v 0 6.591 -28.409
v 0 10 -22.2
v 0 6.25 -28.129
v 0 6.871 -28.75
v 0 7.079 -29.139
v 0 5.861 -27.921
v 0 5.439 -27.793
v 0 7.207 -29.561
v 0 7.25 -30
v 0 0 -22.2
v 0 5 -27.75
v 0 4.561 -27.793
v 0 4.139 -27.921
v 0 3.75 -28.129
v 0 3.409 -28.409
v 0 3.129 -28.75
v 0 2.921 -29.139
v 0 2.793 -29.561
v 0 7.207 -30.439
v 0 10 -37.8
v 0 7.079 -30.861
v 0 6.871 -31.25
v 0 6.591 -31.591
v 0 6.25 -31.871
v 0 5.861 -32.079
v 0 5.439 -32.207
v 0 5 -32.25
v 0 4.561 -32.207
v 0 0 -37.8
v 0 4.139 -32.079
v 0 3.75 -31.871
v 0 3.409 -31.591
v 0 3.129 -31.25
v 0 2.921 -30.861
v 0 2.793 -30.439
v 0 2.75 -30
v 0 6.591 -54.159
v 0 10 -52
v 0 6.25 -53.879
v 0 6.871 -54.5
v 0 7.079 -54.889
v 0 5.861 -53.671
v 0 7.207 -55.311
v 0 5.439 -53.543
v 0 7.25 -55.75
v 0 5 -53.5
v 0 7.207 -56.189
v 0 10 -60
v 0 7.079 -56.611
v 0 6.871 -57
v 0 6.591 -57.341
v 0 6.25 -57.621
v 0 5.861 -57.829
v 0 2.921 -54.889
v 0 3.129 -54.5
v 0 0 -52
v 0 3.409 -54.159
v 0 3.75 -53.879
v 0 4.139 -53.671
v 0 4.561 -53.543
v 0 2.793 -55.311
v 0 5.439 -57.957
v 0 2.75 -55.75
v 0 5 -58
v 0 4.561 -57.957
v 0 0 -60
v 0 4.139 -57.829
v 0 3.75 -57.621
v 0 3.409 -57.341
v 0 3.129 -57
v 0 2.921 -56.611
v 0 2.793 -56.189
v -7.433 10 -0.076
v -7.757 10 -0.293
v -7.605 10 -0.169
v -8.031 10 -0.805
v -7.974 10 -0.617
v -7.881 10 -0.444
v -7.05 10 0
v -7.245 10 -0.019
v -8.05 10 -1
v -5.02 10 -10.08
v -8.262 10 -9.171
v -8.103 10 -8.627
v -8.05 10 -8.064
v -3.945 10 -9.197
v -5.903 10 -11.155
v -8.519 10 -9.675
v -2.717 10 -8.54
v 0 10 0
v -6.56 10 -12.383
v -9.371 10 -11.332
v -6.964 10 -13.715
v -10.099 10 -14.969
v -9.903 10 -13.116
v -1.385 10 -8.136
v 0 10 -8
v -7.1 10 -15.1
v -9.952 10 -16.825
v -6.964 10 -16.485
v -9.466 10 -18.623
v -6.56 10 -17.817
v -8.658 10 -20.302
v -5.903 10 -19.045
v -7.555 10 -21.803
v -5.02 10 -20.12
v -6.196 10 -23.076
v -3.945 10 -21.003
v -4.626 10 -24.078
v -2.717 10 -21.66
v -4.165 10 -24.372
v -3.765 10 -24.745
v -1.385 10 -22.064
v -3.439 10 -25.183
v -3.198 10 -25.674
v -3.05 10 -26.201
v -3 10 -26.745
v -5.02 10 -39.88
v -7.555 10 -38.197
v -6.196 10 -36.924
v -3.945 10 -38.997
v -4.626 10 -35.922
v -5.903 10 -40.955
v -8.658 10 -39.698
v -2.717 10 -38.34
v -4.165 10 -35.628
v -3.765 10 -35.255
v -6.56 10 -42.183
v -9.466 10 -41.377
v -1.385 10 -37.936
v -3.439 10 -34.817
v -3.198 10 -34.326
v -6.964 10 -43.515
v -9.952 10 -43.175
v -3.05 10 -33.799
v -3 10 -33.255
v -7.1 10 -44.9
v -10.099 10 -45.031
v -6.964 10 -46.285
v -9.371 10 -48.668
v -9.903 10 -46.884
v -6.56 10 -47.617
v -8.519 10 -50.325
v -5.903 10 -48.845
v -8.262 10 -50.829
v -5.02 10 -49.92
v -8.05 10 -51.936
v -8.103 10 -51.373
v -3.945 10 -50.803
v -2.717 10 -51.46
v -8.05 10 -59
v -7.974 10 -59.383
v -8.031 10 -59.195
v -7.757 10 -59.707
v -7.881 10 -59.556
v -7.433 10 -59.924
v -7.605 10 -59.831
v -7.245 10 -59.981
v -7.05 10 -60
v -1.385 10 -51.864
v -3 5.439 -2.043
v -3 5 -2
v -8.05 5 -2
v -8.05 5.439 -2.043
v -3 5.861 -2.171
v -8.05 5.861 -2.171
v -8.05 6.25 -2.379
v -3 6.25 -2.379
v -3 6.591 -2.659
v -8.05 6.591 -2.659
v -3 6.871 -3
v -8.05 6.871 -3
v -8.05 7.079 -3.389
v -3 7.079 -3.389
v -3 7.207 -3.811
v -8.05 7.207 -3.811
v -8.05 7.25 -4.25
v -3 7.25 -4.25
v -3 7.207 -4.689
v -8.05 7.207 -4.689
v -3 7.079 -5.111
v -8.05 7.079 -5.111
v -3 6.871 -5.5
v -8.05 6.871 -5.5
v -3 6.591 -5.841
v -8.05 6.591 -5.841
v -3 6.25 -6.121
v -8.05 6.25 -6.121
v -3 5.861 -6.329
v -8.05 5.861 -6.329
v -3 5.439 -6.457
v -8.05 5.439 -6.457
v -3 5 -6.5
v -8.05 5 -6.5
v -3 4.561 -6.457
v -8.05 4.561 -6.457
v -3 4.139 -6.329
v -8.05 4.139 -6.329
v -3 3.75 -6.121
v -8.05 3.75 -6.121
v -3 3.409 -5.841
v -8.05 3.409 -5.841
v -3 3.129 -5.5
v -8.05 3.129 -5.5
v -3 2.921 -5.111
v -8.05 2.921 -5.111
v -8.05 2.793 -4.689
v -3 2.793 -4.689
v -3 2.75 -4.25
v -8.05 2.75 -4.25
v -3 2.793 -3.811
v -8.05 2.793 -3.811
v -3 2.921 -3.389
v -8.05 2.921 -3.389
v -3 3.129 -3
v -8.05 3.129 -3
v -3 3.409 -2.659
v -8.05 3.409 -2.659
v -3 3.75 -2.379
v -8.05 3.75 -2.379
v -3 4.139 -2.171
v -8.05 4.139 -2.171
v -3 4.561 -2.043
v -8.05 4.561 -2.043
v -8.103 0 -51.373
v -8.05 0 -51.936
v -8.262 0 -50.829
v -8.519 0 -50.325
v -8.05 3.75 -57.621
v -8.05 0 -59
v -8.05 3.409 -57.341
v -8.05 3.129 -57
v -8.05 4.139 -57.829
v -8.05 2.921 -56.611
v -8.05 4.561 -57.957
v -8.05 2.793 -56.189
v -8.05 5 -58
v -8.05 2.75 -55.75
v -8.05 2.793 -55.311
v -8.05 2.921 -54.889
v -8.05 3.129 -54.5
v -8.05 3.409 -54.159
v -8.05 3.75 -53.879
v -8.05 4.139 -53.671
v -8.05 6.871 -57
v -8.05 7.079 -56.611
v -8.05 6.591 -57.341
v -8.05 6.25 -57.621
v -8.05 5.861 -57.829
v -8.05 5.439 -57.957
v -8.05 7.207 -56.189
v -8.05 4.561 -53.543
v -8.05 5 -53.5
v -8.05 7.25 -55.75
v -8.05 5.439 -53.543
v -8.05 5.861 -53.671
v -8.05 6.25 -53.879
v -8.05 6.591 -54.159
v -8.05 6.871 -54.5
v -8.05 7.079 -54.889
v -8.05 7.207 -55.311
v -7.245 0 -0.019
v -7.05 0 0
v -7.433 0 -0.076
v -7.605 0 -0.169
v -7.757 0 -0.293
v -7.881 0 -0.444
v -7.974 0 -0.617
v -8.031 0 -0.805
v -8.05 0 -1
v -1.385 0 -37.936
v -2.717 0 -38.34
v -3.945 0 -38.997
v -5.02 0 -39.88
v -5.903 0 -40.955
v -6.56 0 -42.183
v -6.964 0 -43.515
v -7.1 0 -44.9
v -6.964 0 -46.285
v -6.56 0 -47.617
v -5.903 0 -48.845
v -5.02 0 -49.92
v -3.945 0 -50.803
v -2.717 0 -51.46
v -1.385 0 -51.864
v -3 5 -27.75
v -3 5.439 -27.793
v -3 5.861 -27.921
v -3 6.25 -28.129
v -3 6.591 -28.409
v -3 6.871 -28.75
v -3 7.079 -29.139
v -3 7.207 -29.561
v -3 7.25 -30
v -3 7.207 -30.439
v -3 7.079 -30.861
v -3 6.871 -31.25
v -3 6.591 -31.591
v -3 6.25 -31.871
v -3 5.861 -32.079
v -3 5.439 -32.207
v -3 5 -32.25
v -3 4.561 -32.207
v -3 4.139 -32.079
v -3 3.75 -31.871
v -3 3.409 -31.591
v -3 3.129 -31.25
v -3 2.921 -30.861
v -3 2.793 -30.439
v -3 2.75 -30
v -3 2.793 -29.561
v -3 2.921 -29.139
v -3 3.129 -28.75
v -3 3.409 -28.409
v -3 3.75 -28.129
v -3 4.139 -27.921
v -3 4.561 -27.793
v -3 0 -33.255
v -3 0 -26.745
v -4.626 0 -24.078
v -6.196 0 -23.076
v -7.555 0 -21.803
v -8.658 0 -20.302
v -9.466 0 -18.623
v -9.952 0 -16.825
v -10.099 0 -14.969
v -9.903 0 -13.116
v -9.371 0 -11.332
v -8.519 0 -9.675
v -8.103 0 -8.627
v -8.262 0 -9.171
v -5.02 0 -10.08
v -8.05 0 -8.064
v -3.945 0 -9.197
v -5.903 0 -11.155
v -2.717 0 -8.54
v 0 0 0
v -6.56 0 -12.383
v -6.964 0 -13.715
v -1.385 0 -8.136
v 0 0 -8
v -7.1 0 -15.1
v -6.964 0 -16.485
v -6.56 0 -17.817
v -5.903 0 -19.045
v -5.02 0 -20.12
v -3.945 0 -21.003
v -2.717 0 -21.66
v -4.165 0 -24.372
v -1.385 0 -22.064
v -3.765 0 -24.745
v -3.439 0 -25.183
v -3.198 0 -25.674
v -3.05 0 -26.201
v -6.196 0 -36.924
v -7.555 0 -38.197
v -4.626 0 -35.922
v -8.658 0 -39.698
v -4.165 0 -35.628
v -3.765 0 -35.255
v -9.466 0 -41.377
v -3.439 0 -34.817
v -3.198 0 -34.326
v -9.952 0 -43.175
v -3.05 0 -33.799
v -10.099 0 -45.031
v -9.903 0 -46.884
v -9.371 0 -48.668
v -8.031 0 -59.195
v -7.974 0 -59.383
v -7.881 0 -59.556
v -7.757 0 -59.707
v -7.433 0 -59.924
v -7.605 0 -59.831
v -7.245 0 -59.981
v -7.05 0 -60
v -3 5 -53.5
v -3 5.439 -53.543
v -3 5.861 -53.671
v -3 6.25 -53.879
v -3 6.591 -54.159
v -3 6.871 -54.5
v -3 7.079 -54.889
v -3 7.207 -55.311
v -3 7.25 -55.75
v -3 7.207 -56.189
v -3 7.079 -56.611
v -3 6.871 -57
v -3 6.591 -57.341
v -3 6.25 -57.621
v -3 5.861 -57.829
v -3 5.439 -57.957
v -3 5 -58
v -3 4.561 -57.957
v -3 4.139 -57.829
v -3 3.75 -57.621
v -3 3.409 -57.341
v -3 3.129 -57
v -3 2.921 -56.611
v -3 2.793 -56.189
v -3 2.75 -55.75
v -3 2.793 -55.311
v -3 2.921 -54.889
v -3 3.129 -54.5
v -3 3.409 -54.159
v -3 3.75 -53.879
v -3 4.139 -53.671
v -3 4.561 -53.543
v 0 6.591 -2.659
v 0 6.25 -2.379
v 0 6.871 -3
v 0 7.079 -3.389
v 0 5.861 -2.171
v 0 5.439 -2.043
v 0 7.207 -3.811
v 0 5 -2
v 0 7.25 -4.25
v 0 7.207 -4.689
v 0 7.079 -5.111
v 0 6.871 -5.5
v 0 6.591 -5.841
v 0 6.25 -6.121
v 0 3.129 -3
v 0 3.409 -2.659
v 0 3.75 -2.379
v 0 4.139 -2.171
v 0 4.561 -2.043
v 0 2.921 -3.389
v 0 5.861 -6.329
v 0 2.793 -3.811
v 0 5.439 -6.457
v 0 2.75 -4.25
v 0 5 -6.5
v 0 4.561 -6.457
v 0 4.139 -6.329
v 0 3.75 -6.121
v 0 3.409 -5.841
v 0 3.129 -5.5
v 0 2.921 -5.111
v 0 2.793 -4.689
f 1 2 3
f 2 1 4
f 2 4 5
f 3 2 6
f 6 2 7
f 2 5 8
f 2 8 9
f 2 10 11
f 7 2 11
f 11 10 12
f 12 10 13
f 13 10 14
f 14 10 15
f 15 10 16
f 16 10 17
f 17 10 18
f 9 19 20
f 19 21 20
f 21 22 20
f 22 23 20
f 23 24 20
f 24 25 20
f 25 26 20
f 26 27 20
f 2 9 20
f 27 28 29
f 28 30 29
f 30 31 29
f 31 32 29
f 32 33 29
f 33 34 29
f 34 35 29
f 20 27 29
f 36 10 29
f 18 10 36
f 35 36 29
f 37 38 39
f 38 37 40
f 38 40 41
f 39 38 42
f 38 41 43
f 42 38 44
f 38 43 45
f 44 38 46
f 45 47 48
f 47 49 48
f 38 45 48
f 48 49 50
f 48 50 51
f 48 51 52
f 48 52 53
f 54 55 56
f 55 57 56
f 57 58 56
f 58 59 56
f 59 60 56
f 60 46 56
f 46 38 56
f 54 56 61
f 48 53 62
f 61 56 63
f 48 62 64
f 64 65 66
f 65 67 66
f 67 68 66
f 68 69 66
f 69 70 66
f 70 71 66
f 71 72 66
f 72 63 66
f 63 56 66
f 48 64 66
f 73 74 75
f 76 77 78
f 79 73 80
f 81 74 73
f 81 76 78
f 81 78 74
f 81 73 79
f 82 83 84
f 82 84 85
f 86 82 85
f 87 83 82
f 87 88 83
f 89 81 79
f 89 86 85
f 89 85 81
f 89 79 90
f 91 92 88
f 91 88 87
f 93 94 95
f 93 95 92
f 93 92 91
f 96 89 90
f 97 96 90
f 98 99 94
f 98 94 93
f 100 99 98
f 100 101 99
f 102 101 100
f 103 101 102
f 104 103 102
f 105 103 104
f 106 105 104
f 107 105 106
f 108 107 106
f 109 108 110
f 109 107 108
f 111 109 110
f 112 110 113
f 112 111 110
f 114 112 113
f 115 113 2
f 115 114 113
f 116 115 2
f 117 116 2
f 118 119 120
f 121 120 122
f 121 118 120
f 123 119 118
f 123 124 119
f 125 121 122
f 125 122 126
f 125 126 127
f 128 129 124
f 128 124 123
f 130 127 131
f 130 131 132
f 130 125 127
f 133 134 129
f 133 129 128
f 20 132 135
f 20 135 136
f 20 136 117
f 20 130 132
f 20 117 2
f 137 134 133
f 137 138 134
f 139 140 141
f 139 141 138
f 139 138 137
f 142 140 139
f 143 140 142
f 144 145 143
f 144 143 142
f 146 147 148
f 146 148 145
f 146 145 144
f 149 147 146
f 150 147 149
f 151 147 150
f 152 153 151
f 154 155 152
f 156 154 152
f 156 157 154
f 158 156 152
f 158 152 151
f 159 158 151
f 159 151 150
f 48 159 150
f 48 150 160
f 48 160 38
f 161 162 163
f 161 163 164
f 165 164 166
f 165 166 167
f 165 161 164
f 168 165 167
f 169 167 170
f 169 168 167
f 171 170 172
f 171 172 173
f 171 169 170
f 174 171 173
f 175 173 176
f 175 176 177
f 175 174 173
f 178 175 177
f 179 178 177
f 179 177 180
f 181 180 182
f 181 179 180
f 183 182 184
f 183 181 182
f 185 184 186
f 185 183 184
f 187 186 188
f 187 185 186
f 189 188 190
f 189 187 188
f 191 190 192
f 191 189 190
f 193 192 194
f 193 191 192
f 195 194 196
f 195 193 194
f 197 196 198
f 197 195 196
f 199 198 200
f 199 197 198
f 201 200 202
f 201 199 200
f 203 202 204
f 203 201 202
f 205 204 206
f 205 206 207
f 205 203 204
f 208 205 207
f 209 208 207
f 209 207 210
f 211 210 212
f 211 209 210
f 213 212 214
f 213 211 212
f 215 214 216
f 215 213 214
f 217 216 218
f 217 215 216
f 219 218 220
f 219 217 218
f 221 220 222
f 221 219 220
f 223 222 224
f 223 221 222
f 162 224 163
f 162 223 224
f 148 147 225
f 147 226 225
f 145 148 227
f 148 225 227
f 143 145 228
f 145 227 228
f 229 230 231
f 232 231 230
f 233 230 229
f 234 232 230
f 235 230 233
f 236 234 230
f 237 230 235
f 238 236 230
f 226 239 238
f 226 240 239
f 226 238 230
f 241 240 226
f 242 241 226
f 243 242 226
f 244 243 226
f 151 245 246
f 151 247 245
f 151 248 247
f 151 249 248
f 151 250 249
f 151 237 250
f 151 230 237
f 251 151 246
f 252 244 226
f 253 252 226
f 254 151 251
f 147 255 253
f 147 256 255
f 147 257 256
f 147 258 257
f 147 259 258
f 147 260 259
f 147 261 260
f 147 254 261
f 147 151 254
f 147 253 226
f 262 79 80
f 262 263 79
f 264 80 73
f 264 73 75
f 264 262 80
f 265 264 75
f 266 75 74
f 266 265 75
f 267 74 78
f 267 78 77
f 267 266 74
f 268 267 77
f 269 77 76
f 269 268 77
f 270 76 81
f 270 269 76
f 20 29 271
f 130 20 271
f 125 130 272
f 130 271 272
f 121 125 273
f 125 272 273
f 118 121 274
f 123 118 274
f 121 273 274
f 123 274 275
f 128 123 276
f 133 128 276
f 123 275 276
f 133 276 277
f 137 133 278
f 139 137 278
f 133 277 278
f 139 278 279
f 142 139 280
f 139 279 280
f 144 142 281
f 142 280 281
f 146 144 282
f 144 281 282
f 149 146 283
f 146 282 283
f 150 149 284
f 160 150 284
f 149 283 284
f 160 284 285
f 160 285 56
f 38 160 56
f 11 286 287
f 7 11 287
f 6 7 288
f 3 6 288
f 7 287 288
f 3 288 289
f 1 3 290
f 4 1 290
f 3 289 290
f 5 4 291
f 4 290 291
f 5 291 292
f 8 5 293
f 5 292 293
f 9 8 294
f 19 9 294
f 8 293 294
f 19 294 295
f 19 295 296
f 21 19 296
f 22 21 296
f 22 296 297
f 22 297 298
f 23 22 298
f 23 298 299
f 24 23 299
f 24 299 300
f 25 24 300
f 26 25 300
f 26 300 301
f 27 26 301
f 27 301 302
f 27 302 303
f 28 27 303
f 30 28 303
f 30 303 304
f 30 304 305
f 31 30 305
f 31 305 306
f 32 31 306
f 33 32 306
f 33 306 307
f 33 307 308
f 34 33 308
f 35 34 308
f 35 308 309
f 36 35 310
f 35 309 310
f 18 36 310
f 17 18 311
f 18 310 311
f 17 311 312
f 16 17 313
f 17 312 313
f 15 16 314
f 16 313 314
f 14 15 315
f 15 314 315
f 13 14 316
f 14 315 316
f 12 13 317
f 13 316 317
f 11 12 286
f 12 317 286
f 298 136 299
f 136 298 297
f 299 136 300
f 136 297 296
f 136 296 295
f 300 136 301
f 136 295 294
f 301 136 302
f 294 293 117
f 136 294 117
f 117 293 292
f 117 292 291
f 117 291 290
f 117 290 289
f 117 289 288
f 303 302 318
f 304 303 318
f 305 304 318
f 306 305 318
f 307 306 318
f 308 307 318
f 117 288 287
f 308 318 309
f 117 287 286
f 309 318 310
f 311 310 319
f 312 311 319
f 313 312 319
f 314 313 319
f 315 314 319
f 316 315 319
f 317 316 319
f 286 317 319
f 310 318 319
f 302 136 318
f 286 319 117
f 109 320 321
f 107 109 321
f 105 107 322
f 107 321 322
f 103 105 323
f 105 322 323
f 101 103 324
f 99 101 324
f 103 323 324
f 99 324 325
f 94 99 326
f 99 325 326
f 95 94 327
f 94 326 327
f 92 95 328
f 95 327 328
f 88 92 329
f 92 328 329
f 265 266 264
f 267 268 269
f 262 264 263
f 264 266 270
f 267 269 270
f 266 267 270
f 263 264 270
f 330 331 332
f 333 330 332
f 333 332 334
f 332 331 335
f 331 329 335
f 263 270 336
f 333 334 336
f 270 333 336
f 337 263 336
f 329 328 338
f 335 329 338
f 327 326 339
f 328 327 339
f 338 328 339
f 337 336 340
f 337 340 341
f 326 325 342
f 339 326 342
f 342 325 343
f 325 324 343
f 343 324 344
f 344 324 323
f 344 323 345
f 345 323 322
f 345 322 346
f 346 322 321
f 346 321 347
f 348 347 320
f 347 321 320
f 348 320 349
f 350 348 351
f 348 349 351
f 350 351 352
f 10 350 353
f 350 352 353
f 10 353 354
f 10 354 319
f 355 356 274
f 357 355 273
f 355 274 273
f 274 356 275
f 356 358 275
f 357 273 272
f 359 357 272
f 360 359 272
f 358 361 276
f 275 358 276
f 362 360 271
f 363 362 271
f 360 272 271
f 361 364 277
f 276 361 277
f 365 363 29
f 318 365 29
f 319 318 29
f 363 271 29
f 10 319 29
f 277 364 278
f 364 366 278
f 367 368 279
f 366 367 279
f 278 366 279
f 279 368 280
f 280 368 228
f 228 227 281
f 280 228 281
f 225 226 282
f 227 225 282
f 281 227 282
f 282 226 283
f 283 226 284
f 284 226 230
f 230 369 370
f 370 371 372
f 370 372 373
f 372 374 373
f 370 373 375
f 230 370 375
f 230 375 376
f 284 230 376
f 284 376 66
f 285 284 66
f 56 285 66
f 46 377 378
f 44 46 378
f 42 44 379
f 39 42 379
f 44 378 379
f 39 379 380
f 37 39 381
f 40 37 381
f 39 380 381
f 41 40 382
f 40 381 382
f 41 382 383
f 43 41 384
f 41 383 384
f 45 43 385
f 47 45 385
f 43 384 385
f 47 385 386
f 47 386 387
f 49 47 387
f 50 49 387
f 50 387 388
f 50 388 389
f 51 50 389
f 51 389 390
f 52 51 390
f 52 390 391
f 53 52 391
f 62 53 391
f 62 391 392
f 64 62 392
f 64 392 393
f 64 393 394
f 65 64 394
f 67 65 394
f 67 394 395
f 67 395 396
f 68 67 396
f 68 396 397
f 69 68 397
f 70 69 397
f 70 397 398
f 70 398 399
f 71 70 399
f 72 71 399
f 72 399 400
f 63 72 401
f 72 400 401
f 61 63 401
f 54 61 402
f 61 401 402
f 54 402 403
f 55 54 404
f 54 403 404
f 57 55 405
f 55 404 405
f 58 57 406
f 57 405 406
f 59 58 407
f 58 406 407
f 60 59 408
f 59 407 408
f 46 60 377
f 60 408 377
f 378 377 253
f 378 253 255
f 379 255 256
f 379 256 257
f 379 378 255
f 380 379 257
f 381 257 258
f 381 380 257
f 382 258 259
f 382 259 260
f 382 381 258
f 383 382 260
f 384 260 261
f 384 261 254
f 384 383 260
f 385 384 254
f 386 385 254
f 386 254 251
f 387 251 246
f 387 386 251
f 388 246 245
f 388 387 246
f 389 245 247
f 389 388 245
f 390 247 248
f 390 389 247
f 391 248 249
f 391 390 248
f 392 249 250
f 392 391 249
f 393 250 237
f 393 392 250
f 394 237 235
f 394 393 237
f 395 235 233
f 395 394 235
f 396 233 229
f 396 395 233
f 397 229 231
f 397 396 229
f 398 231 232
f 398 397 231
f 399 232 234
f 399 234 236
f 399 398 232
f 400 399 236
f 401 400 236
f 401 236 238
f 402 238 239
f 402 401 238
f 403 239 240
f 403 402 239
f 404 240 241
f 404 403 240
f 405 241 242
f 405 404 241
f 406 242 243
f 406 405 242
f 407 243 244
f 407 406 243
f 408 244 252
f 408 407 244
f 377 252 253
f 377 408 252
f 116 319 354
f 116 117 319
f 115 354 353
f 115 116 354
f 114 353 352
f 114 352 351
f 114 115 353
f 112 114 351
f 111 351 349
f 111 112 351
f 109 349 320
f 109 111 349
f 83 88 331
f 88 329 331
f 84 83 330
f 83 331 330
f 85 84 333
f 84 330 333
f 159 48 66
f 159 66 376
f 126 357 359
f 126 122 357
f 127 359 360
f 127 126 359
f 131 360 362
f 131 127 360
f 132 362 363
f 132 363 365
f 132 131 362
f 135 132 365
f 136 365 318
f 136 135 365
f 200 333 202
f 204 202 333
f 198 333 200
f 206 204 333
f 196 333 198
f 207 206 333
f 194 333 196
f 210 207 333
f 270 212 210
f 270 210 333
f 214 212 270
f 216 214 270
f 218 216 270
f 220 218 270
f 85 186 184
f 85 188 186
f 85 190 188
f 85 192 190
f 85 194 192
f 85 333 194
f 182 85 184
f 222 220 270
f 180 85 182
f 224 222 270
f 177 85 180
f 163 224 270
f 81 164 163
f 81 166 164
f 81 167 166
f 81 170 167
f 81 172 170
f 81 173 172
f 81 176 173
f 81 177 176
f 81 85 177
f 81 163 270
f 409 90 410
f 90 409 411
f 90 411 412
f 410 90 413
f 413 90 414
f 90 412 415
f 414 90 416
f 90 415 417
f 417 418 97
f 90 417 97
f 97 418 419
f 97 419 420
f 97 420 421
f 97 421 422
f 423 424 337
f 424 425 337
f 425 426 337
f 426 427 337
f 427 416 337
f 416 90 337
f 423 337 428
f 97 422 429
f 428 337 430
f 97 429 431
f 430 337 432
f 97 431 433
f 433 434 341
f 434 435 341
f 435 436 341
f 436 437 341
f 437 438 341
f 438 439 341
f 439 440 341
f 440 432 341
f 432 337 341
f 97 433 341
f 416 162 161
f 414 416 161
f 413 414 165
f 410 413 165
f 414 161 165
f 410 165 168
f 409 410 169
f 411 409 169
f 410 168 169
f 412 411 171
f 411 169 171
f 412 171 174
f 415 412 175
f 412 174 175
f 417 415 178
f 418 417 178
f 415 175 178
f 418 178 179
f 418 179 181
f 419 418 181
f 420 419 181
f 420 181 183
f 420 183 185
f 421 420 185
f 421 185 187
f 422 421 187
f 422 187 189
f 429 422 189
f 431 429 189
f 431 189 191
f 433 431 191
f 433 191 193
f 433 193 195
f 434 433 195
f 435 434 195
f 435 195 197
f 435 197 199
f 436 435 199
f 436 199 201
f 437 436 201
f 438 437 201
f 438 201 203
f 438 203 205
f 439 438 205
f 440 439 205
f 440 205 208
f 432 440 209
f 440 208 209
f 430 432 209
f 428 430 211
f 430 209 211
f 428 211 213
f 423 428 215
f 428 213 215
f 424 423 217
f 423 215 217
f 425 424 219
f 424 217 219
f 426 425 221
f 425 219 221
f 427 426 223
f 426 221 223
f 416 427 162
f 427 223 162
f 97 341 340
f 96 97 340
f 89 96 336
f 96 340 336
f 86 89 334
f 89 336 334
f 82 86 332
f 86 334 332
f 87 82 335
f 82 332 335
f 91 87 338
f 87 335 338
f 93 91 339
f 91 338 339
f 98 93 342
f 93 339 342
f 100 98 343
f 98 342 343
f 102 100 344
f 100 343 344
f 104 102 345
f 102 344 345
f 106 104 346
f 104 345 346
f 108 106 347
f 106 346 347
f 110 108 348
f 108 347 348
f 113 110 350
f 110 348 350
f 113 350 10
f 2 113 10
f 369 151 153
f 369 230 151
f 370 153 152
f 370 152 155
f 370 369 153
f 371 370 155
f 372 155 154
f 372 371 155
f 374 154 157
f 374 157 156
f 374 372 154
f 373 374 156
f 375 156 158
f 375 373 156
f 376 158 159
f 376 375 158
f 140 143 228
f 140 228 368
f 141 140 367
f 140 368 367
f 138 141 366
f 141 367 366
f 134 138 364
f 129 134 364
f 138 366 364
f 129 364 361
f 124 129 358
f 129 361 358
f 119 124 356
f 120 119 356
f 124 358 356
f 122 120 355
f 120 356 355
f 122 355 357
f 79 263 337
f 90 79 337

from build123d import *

# Parameters (mm, degrees)
EXTRUDE_1_DEPTH          = 10
EXTRUDE_2_DEPTH          = 10
SKETCH_3_R               = 2.25
CUT_EXTRUDE_1_DEPTH      = 5.049845
CUT_EXTRUDE_1_DEPTH_BACK = 4
SKETCH_4_R               = 2.25
CUT_EXTRUDE_2_DEPTH      = 4
FILLET_1_R               = 3
FILLET_2_R               = 1


with BuildPart() as part:
    # Эскиз1 → Бобышка-Вытянуть1 (new body)
    with BuildSketch(Plane(origin=(0, 0, 0), x_dir=(1, 0, 0), z_dir=(0, 1, 0))):
        with BuildLine():
            Line((0, 0), (0, 8))
            ThreePointArc((0, 8), (-7.1, 15.1), (0, 22.2))
            Line((0, 22.2), (0, 37.8))
            ThreePointArc((0, 37.8), (-7.1, 44.9), (0, 52))
            Line((0, 52), (0, 60))
            Line((0, 60), (-3, 60))
            Line((-3, 60), (-3, 54.544169223))
            ThreePointArc((-3, 54.544169223), (-10.1, 44.9), (-3, 35.255830777))
            Line((-3, 35.255830777), (-3, 24.744169223))
            ThreePointArc((-3, 24.744169223), (-10.1, 15.1), (-3, 5.455830777))
            Line((-3, 5.455830777), (-3, 0))
            Line((-3, 0), (0, 0))
        make_face()
    extrude(amount=EXTRUDE_1_DEPTH)

    # Эскиз2 → Бобышка-Вытянуть2 (add)
    with BuildSketch(Plane(origin=(0, 10, 0), x_dir=(1, 0, 0), z_dir=(0, 1, 0))):
        with BuildLine():
            Line((-3, 60), (-8.049844719, 60))
            Line((-8.049844719, 60), (-8.049844719, 51))
            ThreePointArc((-8.049844719, 51), (-5.802159163, 53.167100402), (-3, 54.544169223))
            Line((-3, 54.544169223), (-3, 60))
        make_face()
        with BuildLine():
            Line((-3, 0), (-3, 5.455830777))
            ThreePointArc((-3, 5.455830777), (-5.802159163, 6.832899598), (-8.049844719, 9))
            Line((-8.049844719, 9), (-8.049844719, 0))
            Line((-8.049844719, 0), (-3, 0))
        make_face()
    extrude(amount=-EXTRUDE_2_DEPTH)

    # Эскиз3 → Вырез-Вытянуть1 (cut, two sides)
    with BuildSketch(Plane.ZY.offset(3)) as cut_extrude_1_sk:
        with Locations((-55.75, 5)):
            Circle(SKETCH_3_R)
        with Locations((-4.25, 5)):
            Circle(SKETCH_3_R)
    extrude(amount=CUT_EXTRUDE_1_DEPTH, mode=Mode.SUBTRACT)
    extrude(cut_extrude_1_sk.sketch, amount=-CUT_EXTRUDE_1_DEPTH_BACK, mode=Mode.SUBTRACT)

    # Эскиз4 → Вырез-Вытянуть2 (cut, through all)
    with BuildSketch(Plane.ZY.offset(3)):
        with Locations((-30, 5)):
            Circle(SKETCH_4_R)
    extrude(amount=-CUT_EXTRUDE_2_DEPTH, mode=Mode.SUBTRACT)

    # Скругление1
    fillet_1_edges = [part.edges().sort_by_distance(p)[0] for p in [
        (-3, 5, -24.744169223),
        (-3, 5, -35.255830777),
        (-8.049844719, 5, -51),
        (-8.049844719, 5, -9),
    ]]
    fillet(fillet_1_edges, radius=FILLET_1_R)

    # Скругление2
    fillet_2_edges = [part.edges().sort_by_distance(p)[0] for p in [
        (-8.049844719, 5, -60),
        (-8.049844719, 5, 0),
    ]]
    fillet(fillet_2_edges, radius=FILLET_2_R)


solid = part.part
